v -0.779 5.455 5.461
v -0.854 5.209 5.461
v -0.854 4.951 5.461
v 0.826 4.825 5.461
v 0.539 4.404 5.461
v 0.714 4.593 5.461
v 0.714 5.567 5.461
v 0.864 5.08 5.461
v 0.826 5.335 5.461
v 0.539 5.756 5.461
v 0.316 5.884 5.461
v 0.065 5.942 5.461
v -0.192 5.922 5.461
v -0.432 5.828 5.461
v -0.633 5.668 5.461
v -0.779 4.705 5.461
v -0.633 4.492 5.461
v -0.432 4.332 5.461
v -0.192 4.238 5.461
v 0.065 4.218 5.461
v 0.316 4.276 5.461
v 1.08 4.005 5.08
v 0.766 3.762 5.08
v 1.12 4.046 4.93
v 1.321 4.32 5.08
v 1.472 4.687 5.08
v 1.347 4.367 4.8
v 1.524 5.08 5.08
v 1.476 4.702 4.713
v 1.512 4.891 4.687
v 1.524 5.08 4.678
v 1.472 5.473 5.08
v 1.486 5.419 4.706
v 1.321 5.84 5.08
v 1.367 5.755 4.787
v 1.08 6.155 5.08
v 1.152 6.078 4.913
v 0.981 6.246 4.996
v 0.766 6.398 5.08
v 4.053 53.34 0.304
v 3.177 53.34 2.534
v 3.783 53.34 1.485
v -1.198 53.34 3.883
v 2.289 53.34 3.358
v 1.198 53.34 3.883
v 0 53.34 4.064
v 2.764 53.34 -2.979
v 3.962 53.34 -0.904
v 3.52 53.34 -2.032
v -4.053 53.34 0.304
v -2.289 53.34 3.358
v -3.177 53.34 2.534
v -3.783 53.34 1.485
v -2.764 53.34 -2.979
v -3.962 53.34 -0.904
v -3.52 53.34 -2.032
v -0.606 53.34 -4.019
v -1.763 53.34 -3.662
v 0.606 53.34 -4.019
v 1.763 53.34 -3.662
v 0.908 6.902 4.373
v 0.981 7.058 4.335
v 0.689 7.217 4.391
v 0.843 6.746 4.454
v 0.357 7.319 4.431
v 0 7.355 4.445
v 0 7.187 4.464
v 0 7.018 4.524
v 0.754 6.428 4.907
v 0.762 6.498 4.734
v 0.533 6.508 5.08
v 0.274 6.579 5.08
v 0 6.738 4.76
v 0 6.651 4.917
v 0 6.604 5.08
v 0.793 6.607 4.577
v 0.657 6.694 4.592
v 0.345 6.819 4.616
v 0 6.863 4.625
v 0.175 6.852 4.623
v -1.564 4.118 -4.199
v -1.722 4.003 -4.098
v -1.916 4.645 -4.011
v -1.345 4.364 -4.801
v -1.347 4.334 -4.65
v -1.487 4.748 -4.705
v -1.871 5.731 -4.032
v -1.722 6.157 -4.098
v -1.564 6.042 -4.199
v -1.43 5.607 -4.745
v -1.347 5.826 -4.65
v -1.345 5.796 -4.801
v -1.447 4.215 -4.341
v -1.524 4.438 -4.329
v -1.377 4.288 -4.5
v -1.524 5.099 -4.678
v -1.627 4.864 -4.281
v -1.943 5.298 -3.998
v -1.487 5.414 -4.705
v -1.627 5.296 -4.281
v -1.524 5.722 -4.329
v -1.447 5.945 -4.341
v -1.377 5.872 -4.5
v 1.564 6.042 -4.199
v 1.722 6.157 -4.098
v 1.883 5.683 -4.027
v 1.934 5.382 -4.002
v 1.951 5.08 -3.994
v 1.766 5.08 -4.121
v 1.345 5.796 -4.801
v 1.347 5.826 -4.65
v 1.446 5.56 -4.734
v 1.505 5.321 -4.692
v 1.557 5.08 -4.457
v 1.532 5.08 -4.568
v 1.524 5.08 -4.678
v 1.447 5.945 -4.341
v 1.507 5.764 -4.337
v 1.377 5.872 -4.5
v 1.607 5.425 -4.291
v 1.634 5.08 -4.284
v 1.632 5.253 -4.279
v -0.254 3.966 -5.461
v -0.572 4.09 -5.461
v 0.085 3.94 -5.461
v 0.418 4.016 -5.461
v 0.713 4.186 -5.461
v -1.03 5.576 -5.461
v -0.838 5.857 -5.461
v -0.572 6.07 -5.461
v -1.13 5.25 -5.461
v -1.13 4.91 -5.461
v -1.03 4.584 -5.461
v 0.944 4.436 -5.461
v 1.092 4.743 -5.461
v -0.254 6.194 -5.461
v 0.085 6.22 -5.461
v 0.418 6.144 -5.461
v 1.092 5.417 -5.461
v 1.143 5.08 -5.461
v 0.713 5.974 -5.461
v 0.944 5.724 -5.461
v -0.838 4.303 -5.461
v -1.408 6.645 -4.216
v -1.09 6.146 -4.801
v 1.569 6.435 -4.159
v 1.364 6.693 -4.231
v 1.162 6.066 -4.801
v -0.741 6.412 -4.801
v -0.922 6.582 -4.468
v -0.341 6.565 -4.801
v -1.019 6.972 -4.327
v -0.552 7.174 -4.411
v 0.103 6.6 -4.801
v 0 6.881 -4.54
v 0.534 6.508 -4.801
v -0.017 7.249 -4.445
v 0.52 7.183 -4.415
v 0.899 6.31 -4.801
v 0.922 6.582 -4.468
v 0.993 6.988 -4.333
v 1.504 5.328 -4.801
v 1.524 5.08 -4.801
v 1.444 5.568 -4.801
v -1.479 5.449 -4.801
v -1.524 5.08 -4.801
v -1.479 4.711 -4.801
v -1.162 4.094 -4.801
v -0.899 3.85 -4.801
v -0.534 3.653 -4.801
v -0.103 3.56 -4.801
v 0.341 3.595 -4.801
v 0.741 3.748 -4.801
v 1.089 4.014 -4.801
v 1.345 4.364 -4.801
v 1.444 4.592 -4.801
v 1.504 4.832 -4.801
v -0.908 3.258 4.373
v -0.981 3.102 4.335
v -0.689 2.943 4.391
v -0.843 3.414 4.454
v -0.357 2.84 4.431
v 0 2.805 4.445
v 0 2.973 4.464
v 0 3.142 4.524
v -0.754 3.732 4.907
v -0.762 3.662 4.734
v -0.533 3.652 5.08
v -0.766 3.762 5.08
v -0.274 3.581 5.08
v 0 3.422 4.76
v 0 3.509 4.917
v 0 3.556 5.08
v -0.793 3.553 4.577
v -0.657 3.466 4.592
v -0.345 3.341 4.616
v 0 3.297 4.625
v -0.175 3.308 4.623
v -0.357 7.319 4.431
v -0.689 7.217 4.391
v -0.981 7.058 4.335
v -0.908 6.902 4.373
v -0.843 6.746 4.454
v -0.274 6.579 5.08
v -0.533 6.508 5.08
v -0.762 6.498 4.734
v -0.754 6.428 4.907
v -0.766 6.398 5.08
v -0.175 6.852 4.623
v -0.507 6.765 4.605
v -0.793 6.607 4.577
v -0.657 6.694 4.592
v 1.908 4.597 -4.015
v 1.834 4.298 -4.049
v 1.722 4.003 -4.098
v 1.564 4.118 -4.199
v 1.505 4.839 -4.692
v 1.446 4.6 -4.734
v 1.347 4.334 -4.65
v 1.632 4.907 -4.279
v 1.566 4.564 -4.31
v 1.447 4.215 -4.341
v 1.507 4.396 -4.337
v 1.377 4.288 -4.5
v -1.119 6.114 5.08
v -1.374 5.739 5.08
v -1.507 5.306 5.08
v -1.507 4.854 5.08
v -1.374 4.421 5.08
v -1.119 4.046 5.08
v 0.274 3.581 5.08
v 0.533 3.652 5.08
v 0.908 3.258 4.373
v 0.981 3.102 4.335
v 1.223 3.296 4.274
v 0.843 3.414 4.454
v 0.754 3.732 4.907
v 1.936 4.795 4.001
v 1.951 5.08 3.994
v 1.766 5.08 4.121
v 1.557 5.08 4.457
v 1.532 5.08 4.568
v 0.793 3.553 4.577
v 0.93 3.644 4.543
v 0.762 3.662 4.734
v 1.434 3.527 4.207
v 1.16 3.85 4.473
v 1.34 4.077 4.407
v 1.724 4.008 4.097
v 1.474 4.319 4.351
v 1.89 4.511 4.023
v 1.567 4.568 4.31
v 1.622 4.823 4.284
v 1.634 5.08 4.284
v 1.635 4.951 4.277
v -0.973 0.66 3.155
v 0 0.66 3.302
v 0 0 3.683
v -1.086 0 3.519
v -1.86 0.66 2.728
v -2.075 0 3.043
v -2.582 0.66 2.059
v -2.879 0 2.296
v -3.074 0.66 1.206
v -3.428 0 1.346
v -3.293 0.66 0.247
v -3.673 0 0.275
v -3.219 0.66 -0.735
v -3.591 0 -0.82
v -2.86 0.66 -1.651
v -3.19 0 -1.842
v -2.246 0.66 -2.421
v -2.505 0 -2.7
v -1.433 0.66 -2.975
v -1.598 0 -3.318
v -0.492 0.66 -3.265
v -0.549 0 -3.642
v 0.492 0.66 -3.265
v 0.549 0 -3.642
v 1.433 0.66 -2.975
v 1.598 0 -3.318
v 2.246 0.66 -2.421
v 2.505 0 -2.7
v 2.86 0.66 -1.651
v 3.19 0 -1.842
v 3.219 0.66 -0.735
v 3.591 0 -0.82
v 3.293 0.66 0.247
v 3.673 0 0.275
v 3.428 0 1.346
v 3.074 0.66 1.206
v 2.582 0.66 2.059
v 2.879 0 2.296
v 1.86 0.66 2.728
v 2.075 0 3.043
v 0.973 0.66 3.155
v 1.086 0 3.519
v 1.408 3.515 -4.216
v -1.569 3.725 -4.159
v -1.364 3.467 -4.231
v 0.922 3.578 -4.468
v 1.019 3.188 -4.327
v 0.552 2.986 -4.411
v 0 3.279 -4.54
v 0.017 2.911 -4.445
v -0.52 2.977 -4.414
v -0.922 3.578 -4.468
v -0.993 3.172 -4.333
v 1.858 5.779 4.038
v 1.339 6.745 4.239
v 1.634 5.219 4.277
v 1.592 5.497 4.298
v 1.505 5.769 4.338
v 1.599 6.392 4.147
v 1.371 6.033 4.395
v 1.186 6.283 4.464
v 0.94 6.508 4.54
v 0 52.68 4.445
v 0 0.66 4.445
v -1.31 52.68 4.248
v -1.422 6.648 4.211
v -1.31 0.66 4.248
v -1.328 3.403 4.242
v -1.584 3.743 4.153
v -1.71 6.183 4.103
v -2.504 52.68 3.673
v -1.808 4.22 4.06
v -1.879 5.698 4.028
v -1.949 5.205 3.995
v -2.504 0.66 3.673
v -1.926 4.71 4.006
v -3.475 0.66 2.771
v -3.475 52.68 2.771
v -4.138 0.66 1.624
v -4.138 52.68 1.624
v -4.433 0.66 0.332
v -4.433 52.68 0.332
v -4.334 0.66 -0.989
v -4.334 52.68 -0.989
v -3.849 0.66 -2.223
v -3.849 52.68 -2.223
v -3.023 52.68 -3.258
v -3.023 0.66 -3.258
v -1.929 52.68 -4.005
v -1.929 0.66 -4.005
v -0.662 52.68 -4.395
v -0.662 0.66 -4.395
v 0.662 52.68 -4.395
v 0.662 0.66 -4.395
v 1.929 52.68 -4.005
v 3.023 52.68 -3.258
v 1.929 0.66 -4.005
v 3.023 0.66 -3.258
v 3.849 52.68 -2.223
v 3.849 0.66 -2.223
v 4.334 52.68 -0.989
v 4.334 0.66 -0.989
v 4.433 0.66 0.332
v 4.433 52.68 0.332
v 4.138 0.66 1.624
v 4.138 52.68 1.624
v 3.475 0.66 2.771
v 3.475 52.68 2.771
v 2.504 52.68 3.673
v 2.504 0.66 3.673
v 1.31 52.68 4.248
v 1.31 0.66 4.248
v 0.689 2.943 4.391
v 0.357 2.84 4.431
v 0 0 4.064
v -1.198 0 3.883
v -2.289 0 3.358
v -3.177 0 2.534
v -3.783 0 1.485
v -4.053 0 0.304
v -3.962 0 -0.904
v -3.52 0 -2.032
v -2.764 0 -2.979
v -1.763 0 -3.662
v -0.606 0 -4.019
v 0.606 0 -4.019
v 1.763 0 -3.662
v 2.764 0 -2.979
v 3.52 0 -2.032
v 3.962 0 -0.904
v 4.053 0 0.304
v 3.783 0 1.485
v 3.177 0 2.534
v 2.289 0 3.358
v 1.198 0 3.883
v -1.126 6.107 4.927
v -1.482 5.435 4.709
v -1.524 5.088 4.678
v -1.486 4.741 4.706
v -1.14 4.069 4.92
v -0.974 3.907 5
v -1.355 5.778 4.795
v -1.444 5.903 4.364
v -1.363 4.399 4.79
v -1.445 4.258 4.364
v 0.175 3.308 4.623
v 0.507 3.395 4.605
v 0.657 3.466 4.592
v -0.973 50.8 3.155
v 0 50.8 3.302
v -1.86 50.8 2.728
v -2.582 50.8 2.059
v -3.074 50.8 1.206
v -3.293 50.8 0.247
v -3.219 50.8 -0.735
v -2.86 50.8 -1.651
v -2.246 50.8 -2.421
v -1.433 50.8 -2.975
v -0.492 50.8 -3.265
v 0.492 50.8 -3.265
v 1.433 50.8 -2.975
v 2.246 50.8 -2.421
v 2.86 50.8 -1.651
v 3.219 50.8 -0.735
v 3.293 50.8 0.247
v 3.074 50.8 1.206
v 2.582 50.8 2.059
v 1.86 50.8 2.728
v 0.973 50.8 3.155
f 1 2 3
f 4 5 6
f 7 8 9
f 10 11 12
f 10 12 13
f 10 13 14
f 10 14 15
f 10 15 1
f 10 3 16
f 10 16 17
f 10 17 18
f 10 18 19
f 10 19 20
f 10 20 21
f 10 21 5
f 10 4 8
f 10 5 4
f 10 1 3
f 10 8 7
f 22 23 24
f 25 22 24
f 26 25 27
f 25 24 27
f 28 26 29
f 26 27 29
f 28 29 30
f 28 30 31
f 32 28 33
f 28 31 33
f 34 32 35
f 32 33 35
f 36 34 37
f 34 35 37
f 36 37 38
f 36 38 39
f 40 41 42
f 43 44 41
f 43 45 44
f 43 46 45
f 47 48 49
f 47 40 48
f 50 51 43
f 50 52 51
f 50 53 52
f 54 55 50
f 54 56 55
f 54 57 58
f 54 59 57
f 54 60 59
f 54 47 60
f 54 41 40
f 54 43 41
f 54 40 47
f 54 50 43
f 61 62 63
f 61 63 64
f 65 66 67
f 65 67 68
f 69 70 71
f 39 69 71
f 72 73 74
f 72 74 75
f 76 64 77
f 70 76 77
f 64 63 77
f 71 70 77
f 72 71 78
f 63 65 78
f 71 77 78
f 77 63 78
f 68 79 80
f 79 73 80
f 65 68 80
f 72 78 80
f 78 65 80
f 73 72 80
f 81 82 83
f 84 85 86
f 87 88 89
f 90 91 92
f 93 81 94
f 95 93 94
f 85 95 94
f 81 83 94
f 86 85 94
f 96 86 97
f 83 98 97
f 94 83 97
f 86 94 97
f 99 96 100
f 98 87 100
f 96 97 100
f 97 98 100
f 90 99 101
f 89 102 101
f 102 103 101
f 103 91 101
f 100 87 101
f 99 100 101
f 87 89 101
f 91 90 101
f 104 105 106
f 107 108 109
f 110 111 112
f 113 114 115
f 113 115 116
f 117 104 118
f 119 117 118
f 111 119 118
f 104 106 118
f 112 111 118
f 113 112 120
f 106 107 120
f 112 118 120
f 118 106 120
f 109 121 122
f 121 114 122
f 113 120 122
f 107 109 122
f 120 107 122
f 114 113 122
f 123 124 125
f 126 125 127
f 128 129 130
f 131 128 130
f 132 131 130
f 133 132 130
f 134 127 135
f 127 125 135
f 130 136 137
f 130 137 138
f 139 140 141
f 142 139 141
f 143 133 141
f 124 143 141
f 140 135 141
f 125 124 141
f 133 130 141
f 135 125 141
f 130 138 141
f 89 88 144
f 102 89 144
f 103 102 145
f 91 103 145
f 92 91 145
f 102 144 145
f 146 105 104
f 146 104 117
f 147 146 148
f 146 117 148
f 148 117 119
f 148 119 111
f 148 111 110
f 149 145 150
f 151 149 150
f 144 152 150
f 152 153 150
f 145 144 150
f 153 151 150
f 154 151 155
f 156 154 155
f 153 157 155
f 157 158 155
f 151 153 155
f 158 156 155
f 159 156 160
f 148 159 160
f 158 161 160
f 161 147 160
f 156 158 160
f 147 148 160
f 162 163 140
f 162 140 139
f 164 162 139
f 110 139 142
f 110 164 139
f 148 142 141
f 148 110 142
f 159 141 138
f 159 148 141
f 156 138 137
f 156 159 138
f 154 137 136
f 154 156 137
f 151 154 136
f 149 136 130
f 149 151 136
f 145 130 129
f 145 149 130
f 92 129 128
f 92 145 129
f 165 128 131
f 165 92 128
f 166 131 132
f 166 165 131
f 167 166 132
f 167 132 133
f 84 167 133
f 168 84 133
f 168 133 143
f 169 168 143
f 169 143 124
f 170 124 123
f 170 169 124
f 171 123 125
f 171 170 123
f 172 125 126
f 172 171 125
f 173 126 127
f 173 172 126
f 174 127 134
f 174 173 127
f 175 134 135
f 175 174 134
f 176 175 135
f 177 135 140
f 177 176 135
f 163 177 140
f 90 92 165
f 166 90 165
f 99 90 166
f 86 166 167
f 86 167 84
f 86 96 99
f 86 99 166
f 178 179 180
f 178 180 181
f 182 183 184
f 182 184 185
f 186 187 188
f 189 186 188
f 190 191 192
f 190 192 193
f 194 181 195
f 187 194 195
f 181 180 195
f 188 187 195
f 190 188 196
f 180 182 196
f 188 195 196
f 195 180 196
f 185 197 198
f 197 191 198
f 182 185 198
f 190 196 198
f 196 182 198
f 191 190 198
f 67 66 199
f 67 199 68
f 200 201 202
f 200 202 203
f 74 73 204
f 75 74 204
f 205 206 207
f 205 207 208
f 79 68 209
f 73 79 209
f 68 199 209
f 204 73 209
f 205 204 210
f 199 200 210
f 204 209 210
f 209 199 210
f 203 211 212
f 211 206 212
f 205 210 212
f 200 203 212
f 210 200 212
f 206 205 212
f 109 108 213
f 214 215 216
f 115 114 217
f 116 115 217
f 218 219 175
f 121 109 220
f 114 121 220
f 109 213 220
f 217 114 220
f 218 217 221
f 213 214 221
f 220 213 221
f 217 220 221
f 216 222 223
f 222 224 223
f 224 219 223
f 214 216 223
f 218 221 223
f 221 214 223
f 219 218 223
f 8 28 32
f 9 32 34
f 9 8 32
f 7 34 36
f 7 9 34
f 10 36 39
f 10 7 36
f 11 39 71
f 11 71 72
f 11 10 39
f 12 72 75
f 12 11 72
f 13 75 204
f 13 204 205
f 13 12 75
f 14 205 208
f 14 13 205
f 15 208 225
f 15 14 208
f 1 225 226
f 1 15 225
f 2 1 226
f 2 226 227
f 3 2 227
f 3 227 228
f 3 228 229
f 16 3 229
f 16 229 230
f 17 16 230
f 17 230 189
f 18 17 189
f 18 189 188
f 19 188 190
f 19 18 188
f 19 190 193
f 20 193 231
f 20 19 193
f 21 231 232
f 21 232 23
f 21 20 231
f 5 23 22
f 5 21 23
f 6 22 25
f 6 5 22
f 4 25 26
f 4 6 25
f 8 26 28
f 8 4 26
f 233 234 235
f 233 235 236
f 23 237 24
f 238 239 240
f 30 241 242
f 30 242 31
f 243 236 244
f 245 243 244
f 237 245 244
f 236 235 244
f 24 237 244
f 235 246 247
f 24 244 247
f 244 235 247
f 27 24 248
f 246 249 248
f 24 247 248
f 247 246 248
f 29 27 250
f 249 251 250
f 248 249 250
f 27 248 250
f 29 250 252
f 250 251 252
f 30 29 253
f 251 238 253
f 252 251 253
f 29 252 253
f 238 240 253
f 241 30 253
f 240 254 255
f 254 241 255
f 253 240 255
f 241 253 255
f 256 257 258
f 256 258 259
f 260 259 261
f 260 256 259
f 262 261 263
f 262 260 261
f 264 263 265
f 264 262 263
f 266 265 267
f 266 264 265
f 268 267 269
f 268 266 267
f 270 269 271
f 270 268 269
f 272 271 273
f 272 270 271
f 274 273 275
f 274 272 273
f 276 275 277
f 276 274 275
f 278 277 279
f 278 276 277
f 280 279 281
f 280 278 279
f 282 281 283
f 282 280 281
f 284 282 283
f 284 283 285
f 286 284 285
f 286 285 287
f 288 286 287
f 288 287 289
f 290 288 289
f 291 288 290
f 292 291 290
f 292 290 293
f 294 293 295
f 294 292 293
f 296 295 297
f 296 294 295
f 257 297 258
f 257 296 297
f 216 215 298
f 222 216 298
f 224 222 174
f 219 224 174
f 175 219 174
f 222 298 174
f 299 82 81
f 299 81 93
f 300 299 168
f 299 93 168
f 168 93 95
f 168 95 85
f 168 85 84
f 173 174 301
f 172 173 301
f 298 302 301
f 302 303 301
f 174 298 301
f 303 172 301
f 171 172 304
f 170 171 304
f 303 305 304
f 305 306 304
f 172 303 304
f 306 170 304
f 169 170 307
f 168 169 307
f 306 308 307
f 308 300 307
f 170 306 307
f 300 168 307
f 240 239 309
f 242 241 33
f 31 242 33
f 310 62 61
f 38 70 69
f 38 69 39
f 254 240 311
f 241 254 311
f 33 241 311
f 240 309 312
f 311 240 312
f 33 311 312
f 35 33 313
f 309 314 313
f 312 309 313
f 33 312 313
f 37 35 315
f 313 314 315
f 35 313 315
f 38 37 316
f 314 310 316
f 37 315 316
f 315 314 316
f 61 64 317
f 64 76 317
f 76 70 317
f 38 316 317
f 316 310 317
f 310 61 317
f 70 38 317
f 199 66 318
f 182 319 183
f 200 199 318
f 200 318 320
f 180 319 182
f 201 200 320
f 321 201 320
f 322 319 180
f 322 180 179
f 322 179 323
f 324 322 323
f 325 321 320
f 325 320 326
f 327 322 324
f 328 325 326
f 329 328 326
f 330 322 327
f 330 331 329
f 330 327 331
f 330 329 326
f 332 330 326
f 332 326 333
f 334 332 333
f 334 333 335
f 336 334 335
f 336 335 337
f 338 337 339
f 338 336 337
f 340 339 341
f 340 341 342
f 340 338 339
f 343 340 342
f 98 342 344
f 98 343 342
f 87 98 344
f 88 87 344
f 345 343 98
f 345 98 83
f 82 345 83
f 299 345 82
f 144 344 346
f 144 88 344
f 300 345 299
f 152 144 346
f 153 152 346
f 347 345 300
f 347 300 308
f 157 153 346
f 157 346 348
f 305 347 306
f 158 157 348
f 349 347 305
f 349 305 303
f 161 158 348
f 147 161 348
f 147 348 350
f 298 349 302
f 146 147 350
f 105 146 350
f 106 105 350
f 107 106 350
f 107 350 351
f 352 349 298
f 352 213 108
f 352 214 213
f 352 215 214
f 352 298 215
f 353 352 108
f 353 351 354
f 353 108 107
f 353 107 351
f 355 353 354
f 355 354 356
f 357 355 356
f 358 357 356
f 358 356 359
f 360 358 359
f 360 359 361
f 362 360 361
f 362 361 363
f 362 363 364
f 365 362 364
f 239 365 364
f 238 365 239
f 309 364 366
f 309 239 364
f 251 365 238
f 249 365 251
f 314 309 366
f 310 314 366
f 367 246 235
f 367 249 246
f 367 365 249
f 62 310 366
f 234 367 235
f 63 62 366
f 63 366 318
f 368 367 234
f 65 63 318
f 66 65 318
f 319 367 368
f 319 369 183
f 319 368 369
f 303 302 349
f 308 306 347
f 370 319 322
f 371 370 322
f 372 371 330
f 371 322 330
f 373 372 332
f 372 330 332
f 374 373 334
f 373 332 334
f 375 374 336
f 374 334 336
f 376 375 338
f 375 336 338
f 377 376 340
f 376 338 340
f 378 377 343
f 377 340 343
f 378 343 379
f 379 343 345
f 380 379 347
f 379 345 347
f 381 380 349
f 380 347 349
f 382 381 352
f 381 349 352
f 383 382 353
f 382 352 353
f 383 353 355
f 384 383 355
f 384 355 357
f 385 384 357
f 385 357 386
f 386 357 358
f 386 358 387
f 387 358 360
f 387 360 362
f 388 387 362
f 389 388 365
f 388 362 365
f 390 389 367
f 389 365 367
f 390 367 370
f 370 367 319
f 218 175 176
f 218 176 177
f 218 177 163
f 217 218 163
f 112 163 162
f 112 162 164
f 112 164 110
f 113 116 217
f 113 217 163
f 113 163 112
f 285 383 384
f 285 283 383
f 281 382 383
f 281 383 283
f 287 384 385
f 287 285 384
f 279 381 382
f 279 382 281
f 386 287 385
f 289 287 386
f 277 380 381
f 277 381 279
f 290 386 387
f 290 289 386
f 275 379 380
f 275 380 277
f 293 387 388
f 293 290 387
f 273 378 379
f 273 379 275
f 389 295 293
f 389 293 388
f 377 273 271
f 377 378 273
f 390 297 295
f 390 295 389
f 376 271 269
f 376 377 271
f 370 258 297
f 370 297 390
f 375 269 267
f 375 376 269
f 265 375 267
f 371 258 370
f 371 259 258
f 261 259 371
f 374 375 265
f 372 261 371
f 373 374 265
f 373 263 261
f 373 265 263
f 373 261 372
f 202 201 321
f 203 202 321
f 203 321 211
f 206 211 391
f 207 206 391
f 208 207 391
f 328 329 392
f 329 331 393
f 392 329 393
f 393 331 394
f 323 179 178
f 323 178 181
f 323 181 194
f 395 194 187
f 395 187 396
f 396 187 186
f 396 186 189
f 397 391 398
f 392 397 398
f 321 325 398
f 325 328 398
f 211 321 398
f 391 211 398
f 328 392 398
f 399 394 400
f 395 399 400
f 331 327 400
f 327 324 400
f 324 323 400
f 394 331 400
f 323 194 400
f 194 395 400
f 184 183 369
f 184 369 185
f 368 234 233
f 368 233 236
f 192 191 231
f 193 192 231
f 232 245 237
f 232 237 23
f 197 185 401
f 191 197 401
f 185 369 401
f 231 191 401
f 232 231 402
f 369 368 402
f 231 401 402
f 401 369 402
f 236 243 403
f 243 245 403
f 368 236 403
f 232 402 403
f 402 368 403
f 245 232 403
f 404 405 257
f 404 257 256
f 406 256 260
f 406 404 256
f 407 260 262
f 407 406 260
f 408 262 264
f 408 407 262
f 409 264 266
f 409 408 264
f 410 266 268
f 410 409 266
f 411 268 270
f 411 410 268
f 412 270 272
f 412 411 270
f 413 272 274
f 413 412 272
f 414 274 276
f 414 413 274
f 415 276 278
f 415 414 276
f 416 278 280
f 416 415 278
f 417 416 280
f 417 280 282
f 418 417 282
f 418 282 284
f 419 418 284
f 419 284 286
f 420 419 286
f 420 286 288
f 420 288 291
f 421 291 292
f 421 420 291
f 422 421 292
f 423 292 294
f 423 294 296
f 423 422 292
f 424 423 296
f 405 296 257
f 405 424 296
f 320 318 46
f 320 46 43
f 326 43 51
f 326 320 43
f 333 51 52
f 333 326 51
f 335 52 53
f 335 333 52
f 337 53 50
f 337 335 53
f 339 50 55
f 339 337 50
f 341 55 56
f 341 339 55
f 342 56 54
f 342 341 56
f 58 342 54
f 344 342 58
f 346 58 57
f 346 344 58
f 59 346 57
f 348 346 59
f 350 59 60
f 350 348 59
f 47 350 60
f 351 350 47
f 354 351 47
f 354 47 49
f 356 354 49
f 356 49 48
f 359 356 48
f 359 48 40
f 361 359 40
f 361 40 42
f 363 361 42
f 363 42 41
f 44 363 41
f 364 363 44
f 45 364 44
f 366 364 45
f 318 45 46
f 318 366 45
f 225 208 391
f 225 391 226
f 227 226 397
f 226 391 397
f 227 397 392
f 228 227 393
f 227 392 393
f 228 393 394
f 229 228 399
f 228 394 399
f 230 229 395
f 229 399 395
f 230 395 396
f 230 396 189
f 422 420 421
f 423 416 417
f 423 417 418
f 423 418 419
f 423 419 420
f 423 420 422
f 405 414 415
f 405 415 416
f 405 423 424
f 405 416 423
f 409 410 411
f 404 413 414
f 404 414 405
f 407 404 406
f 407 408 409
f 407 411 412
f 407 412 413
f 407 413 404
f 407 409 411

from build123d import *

# Parameters (mm, degrees)
BOSS_EXTRUDE1_START   = 4.175578
SKETCH2_R             = 1.524
BOSS_EXTRUDE1_DEPTH   = 1.285422
CHAMFER1_SIZE         = 0.381
CHAMFER1_SIZE2        = 0.659911358
CHAMFER1_PART_2_SIZE  = 0.381
CHAMFER1_PART_2_SIZE2 = 0.659911358
CHAMFER1_PART_3_SIZE  = 0.381
CHAMFER1_PART_3_SIZE2 = 0.659911358
CHAMFER1_PART_4_SIZE  = 0.381
CHAMFER1_PART_4_SIZE2 = 0.659911358
FILLET1_R             = 0.762


with BuildPart() as part:
    # Sketch1 → Revolve1 (revolve)
    with BuildSketch(Plane.XY, mode=Mode.PRIVATE) as revolve1_sk:
        Polygon((3.302, 0), (3.302, 50.8), (0, 50.8), (0, 53.34), (4.445, 53.34), (4.445, 0), align=None)
    revolve(revolve1_sk.sketch.rotate(Axis((0, 50.8, 0), (0, -1, 0)), 90), axis=Axis((0, 50.8, 0), (0, -1, 0)))  # turned: the seam where the file's is

    # Sketch2 → Boss-Extrude1 (add)
    with BuildSketch(Plane.XY.offset(BOSS_EXTRUDE1_START)):
        with Locations((0, 5.08)):
            Circle(SKETCH2_R)
    boss_extrude1 = extrude(amount=BOSS_EXTRUDE1_DEPTH)

    # Mirror1: Boss-Extrude1 across plane
    add(boss_extrude1.mirror(Plane.XY))

    # Chamfer1
    chamfer1_edges = [part.edges().sort_by_distance(p)[0] for p in [
        (-1.524, 5.08, 5.461),
    ]]
    chamfer1_side = [part.faces().sort_by_distance(p)[0] for p in [
        (-1.524, 5.08, 4.818258203),
    ]]
    chamfer(chamfer1_edges, length=CHAMFER1_SIZE, length2=CHAMFER1_SIZE2, reference=chamfer1_side[0])

    # Chamfer1 part 2
    chamfer1_part_2_edges = [part.edges().sort_by_distance(p)[0] for p in [
        (-1.524, 5.08, -5.461),
    ]]
    chamfer1_part_2_side = [part.faces().sort_by_distance(p)[0] for p in [
        (0, 5.08, -5.461),
    ]]
    chamfer(chamfer1_part_2_edges, length=CHAMFER1_PART_2_SIZE, length2=CHAMFER1_PART_2_SIZE2, reference=chamfer1_part_2_side[0])

    # Chamfer1 part 3
    chamfer1_part_3_edges = [part.edges().sort_by_distance(p)[0] for p in [
        (0, 0, -4.445),
        (0, 0, -3.302),
    ]]
    chamfer1_part_3_side = [part.faces().sort_by_distance(p)[0] for p in [
        (0, 0, -4.319276414),
    ]]
    chamfer(chamfer1_part_3_edges, length=CHAMFER1_PART_3_SIZE, length2=CHAMFER1_PART_3_SIZE2, reference=chamfer1_part_3_side[0])

    # Chamfer1 part 4
    chamfer1_part_4_edges = [part.edges().sort_by_distance(p)[0] for p in [
        (0, 53.34, -4.445),
    ]]
    chamfer1_part_4_side = [part.faces().sort_by_distance(p)[0] for p in [
        (0, 53.34, 0),
    ]]
    chamfer(chamfer1_part_4_edges, length=CHAMFER1_PART_4_SIZE, length2=CHAMFER1_PART_4_SIZE2, reference=chamfer1_part_4_side[0])

    # Fillet1
    fillet1_edges = [part.edges().sort_by_distance(p)[0] for p in [
        (-1.524, 5.08, 4.175577685),
        (-1.524, 5.08, -4.175577685),
    ]]
    fillet(fillet1_edges, radius=FILLET1_R)


solid = part.part
